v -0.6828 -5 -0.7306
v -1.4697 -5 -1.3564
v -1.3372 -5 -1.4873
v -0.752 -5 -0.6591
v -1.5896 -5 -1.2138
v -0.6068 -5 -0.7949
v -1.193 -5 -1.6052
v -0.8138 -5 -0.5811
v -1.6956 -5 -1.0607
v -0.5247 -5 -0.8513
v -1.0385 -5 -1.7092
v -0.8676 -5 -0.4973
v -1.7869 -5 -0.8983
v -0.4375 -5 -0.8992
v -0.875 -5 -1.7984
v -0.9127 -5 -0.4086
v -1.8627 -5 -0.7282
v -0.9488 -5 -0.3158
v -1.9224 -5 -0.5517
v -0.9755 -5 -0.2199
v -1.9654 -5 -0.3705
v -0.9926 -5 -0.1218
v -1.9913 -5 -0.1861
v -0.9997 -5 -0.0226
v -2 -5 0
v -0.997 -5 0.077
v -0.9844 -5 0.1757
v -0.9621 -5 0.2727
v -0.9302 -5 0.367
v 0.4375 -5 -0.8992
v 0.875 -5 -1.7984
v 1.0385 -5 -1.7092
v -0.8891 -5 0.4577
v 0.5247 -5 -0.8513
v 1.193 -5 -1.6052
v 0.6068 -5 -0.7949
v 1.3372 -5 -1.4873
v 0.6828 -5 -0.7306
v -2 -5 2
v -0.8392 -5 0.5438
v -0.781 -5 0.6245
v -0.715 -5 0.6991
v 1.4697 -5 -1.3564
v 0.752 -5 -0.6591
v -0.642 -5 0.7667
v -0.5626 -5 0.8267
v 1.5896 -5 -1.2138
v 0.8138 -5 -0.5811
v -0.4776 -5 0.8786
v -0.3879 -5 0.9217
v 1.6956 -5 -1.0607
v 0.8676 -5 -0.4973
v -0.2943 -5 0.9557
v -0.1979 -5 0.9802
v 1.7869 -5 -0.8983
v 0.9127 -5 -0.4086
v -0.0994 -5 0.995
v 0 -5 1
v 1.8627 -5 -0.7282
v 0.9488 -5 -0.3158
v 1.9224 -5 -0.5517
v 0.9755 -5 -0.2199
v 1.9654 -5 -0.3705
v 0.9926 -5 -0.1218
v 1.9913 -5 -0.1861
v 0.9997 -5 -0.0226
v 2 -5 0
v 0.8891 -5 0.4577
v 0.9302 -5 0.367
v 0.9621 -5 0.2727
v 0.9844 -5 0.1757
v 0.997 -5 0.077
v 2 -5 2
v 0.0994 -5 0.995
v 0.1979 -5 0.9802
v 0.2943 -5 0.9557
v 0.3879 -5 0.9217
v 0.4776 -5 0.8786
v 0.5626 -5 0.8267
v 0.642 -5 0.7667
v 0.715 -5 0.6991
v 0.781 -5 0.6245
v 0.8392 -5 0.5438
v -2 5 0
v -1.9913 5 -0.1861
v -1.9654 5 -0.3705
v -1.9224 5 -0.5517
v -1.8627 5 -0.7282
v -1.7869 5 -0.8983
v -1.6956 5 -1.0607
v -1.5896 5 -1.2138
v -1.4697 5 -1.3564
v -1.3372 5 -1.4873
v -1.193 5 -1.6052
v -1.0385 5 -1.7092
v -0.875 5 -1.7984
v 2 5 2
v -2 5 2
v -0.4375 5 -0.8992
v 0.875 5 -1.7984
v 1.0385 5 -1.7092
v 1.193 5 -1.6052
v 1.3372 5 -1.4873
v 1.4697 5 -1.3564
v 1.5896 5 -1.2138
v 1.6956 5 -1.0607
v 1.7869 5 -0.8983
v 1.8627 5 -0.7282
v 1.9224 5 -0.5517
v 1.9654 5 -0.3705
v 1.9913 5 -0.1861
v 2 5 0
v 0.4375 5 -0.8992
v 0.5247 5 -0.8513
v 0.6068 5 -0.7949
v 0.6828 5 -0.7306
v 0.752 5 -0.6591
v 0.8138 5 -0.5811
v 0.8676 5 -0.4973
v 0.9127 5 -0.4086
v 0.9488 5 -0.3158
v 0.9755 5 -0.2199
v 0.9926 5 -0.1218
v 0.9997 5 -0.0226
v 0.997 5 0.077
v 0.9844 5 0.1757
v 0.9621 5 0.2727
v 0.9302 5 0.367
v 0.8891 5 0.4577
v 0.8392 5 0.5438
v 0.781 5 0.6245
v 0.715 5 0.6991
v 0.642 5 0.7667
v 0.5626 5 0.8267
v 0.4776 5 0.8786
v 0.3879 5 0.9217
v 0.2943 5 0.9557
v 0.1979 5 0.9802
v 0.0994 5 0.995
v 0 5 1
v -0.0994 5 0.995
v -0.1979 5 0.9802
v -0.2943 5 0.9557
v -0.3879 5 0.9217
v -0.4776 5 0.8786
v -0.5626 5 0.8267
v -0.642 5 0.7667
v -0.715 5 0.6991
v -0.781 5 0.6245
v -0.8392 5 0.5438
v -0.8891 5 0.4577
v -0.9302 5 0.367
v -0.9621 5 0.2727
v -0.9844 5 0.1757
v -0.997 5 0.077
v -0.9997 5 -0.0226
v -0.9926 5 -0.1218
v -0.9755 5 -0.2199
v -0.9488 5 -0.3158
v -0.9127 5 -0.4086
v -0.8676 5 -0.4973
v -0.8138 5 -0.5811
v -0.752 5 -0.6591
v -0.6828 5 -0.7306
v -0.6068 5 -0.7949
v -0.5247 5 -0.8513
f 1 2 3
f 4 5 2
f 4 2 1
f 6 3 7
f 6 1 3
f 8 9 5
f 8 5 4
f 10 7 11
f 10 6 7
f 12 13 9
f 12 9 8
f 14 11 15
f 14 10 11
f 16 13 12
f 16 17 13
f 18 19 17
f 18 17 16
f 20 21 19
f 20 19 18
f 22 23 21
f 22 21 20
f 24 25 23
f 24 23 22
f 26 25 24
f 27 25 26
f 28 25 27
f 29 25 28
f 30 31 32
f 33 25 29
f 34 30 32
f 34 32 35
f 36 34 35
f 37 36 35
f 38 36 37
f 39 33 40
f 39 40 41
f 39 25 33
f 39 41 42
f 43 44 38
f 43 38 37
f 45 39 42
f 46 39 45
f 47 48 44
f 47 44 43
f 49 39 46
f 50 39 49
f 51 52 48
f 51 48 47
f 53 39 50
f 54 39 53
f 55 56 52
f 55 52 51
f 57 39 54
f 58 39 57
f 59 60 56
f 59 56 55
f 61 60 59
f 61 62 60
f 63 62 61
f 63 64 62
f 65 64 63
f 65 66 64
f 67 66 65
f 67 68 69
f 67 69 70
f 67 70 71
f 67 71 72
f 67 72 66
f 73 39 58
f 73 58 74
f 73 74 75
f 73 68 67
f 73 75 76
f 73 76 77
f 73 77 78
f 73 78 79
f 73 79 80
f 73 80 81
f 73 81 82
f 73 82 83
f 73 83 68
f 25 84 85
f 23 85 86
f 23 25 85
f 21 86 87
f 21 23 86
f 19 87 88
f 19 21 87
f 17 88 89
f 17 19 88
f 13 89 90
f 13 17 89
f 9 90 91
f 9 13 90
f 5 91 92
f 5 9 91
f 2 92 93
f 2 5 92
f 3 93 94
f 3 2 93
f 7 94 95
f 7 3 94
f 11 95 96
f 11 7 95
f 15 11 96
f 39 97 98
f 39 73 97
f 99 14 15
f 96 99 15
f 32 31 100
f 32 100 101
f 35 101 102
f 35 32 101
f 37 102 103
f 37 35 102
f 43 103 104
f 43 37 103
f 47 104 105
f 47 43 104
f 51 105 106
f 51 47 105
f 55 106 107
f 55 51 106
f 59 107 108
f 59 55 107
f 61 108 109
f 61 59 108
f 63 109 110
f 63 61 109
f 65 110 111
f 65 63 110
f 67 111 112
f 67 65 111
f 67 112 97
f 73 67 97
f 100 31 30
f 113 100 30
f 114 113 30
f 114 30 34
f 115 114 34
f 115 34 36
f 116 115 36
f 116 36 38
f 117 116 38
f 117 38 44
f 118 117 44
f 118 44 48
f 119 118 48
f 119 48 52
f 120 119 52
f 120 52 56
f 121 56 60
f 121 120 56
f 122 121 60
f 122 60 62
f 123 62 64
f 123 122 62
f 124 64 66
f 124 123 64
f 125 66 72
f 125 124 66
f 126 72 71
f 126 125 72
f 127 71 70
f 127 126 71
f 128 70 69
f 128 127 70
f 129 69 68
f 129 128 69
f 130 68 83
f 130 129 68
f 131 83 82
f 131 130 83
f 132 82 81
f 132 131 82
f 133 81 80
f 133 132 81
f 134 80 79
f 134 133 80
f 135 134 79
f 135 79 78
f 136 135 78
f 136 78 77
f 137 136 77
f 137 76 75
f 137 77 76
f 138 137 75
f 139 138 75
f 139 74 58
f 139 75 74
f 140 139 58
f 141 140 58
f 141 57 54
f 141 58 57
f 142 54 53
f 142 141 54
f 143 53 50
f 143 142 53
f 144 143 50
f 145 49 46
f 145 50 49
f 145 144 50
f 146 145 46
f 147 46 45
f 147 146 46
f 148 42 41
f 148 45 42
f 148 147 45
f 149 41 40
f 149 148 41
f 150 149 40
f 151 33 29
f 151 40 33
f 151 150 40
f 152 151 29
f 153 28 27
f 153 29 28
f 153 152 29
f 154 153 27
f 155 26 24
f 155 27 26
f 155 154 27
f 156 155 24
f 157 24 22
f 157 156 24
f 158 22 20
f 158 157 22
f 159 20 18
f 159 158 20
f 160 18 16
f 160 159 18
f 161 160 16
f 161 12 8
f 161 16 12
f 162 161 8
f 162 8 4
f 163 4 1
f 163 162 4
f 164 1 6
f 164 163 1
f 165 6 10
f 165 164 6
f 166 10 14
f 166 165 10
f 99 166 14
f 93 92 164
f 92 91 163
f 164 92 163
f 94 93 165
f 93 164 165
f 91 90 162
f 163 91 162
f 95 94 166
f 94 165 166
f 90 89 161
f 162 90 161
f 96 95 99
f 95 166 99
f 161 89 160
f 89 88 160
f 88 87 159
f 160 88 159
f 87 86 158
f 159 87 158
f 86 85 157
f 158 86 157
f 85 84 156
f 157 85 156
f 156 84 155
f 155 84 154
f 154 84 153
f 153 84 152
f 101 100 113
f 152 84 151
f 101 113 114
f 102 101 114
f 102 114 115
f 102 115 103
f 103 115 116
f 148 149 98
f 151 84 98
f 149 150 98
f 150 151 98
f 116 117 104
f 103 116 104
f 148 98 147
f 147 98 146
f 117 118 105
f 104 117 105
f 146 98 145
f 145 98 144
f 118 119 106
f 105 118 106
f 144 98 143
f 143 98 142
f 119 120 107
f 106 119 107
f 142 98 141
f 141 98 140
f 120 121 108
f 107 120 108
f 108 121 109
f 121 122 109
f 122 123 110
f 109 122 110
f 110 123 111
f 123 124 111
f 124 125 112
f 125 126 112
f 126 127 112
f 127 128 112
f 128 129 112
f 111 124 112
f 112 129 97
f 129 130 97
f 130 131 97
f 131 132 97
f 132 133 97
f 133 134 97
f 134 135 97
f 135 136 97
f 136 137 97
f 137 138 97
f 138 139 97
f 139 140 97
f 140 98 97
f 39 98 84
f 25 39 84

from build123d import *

# Parameters (mm, degrees)
F0_R     = 1
F1_DEPTH = 5
F3_DEPTH = 10.001


# Not quite as in the source:
# - a feature of the source that left no trace in its solid (it failed there, or was rolled back) is left out


with BuildPart() as f1:
    # F0 (on Front) → F1 (new body, symmetric)
    with BuildSketch(Plane.XZ):
        with BuildLine():
            Line((-2, 2), (-2, 0))
            ThreePointArc((-2, 0), (0, -2), (2, 0))
            Line((2, 0), (2, 2))
            Line((2, 2), (0, 2))
            Line((0, 2), (-2, 2))
        make_face()
        Circle(F0_R, mode=Mode.SUBTRACT)
    extrude(amount=F1_DEPTH, both=True)

    # F2 (on face) → F3 (cut, through all)
    with BuildSketch(Plane.XZ.offset(5)):
        with BuildLine():
            Line((0.875, -1.7984368212), (0, 0))
            Line((0, 0), (-0.875, -1.7984368212))
            ThreePointArc((-0.875, -1.7984368212), (0, -2), (0.875, -1.7984368212))
        make_face()
    extrude(amount=-F3_DEPTH, mode=Mode.SUBTRACT)


solid = f1.part
